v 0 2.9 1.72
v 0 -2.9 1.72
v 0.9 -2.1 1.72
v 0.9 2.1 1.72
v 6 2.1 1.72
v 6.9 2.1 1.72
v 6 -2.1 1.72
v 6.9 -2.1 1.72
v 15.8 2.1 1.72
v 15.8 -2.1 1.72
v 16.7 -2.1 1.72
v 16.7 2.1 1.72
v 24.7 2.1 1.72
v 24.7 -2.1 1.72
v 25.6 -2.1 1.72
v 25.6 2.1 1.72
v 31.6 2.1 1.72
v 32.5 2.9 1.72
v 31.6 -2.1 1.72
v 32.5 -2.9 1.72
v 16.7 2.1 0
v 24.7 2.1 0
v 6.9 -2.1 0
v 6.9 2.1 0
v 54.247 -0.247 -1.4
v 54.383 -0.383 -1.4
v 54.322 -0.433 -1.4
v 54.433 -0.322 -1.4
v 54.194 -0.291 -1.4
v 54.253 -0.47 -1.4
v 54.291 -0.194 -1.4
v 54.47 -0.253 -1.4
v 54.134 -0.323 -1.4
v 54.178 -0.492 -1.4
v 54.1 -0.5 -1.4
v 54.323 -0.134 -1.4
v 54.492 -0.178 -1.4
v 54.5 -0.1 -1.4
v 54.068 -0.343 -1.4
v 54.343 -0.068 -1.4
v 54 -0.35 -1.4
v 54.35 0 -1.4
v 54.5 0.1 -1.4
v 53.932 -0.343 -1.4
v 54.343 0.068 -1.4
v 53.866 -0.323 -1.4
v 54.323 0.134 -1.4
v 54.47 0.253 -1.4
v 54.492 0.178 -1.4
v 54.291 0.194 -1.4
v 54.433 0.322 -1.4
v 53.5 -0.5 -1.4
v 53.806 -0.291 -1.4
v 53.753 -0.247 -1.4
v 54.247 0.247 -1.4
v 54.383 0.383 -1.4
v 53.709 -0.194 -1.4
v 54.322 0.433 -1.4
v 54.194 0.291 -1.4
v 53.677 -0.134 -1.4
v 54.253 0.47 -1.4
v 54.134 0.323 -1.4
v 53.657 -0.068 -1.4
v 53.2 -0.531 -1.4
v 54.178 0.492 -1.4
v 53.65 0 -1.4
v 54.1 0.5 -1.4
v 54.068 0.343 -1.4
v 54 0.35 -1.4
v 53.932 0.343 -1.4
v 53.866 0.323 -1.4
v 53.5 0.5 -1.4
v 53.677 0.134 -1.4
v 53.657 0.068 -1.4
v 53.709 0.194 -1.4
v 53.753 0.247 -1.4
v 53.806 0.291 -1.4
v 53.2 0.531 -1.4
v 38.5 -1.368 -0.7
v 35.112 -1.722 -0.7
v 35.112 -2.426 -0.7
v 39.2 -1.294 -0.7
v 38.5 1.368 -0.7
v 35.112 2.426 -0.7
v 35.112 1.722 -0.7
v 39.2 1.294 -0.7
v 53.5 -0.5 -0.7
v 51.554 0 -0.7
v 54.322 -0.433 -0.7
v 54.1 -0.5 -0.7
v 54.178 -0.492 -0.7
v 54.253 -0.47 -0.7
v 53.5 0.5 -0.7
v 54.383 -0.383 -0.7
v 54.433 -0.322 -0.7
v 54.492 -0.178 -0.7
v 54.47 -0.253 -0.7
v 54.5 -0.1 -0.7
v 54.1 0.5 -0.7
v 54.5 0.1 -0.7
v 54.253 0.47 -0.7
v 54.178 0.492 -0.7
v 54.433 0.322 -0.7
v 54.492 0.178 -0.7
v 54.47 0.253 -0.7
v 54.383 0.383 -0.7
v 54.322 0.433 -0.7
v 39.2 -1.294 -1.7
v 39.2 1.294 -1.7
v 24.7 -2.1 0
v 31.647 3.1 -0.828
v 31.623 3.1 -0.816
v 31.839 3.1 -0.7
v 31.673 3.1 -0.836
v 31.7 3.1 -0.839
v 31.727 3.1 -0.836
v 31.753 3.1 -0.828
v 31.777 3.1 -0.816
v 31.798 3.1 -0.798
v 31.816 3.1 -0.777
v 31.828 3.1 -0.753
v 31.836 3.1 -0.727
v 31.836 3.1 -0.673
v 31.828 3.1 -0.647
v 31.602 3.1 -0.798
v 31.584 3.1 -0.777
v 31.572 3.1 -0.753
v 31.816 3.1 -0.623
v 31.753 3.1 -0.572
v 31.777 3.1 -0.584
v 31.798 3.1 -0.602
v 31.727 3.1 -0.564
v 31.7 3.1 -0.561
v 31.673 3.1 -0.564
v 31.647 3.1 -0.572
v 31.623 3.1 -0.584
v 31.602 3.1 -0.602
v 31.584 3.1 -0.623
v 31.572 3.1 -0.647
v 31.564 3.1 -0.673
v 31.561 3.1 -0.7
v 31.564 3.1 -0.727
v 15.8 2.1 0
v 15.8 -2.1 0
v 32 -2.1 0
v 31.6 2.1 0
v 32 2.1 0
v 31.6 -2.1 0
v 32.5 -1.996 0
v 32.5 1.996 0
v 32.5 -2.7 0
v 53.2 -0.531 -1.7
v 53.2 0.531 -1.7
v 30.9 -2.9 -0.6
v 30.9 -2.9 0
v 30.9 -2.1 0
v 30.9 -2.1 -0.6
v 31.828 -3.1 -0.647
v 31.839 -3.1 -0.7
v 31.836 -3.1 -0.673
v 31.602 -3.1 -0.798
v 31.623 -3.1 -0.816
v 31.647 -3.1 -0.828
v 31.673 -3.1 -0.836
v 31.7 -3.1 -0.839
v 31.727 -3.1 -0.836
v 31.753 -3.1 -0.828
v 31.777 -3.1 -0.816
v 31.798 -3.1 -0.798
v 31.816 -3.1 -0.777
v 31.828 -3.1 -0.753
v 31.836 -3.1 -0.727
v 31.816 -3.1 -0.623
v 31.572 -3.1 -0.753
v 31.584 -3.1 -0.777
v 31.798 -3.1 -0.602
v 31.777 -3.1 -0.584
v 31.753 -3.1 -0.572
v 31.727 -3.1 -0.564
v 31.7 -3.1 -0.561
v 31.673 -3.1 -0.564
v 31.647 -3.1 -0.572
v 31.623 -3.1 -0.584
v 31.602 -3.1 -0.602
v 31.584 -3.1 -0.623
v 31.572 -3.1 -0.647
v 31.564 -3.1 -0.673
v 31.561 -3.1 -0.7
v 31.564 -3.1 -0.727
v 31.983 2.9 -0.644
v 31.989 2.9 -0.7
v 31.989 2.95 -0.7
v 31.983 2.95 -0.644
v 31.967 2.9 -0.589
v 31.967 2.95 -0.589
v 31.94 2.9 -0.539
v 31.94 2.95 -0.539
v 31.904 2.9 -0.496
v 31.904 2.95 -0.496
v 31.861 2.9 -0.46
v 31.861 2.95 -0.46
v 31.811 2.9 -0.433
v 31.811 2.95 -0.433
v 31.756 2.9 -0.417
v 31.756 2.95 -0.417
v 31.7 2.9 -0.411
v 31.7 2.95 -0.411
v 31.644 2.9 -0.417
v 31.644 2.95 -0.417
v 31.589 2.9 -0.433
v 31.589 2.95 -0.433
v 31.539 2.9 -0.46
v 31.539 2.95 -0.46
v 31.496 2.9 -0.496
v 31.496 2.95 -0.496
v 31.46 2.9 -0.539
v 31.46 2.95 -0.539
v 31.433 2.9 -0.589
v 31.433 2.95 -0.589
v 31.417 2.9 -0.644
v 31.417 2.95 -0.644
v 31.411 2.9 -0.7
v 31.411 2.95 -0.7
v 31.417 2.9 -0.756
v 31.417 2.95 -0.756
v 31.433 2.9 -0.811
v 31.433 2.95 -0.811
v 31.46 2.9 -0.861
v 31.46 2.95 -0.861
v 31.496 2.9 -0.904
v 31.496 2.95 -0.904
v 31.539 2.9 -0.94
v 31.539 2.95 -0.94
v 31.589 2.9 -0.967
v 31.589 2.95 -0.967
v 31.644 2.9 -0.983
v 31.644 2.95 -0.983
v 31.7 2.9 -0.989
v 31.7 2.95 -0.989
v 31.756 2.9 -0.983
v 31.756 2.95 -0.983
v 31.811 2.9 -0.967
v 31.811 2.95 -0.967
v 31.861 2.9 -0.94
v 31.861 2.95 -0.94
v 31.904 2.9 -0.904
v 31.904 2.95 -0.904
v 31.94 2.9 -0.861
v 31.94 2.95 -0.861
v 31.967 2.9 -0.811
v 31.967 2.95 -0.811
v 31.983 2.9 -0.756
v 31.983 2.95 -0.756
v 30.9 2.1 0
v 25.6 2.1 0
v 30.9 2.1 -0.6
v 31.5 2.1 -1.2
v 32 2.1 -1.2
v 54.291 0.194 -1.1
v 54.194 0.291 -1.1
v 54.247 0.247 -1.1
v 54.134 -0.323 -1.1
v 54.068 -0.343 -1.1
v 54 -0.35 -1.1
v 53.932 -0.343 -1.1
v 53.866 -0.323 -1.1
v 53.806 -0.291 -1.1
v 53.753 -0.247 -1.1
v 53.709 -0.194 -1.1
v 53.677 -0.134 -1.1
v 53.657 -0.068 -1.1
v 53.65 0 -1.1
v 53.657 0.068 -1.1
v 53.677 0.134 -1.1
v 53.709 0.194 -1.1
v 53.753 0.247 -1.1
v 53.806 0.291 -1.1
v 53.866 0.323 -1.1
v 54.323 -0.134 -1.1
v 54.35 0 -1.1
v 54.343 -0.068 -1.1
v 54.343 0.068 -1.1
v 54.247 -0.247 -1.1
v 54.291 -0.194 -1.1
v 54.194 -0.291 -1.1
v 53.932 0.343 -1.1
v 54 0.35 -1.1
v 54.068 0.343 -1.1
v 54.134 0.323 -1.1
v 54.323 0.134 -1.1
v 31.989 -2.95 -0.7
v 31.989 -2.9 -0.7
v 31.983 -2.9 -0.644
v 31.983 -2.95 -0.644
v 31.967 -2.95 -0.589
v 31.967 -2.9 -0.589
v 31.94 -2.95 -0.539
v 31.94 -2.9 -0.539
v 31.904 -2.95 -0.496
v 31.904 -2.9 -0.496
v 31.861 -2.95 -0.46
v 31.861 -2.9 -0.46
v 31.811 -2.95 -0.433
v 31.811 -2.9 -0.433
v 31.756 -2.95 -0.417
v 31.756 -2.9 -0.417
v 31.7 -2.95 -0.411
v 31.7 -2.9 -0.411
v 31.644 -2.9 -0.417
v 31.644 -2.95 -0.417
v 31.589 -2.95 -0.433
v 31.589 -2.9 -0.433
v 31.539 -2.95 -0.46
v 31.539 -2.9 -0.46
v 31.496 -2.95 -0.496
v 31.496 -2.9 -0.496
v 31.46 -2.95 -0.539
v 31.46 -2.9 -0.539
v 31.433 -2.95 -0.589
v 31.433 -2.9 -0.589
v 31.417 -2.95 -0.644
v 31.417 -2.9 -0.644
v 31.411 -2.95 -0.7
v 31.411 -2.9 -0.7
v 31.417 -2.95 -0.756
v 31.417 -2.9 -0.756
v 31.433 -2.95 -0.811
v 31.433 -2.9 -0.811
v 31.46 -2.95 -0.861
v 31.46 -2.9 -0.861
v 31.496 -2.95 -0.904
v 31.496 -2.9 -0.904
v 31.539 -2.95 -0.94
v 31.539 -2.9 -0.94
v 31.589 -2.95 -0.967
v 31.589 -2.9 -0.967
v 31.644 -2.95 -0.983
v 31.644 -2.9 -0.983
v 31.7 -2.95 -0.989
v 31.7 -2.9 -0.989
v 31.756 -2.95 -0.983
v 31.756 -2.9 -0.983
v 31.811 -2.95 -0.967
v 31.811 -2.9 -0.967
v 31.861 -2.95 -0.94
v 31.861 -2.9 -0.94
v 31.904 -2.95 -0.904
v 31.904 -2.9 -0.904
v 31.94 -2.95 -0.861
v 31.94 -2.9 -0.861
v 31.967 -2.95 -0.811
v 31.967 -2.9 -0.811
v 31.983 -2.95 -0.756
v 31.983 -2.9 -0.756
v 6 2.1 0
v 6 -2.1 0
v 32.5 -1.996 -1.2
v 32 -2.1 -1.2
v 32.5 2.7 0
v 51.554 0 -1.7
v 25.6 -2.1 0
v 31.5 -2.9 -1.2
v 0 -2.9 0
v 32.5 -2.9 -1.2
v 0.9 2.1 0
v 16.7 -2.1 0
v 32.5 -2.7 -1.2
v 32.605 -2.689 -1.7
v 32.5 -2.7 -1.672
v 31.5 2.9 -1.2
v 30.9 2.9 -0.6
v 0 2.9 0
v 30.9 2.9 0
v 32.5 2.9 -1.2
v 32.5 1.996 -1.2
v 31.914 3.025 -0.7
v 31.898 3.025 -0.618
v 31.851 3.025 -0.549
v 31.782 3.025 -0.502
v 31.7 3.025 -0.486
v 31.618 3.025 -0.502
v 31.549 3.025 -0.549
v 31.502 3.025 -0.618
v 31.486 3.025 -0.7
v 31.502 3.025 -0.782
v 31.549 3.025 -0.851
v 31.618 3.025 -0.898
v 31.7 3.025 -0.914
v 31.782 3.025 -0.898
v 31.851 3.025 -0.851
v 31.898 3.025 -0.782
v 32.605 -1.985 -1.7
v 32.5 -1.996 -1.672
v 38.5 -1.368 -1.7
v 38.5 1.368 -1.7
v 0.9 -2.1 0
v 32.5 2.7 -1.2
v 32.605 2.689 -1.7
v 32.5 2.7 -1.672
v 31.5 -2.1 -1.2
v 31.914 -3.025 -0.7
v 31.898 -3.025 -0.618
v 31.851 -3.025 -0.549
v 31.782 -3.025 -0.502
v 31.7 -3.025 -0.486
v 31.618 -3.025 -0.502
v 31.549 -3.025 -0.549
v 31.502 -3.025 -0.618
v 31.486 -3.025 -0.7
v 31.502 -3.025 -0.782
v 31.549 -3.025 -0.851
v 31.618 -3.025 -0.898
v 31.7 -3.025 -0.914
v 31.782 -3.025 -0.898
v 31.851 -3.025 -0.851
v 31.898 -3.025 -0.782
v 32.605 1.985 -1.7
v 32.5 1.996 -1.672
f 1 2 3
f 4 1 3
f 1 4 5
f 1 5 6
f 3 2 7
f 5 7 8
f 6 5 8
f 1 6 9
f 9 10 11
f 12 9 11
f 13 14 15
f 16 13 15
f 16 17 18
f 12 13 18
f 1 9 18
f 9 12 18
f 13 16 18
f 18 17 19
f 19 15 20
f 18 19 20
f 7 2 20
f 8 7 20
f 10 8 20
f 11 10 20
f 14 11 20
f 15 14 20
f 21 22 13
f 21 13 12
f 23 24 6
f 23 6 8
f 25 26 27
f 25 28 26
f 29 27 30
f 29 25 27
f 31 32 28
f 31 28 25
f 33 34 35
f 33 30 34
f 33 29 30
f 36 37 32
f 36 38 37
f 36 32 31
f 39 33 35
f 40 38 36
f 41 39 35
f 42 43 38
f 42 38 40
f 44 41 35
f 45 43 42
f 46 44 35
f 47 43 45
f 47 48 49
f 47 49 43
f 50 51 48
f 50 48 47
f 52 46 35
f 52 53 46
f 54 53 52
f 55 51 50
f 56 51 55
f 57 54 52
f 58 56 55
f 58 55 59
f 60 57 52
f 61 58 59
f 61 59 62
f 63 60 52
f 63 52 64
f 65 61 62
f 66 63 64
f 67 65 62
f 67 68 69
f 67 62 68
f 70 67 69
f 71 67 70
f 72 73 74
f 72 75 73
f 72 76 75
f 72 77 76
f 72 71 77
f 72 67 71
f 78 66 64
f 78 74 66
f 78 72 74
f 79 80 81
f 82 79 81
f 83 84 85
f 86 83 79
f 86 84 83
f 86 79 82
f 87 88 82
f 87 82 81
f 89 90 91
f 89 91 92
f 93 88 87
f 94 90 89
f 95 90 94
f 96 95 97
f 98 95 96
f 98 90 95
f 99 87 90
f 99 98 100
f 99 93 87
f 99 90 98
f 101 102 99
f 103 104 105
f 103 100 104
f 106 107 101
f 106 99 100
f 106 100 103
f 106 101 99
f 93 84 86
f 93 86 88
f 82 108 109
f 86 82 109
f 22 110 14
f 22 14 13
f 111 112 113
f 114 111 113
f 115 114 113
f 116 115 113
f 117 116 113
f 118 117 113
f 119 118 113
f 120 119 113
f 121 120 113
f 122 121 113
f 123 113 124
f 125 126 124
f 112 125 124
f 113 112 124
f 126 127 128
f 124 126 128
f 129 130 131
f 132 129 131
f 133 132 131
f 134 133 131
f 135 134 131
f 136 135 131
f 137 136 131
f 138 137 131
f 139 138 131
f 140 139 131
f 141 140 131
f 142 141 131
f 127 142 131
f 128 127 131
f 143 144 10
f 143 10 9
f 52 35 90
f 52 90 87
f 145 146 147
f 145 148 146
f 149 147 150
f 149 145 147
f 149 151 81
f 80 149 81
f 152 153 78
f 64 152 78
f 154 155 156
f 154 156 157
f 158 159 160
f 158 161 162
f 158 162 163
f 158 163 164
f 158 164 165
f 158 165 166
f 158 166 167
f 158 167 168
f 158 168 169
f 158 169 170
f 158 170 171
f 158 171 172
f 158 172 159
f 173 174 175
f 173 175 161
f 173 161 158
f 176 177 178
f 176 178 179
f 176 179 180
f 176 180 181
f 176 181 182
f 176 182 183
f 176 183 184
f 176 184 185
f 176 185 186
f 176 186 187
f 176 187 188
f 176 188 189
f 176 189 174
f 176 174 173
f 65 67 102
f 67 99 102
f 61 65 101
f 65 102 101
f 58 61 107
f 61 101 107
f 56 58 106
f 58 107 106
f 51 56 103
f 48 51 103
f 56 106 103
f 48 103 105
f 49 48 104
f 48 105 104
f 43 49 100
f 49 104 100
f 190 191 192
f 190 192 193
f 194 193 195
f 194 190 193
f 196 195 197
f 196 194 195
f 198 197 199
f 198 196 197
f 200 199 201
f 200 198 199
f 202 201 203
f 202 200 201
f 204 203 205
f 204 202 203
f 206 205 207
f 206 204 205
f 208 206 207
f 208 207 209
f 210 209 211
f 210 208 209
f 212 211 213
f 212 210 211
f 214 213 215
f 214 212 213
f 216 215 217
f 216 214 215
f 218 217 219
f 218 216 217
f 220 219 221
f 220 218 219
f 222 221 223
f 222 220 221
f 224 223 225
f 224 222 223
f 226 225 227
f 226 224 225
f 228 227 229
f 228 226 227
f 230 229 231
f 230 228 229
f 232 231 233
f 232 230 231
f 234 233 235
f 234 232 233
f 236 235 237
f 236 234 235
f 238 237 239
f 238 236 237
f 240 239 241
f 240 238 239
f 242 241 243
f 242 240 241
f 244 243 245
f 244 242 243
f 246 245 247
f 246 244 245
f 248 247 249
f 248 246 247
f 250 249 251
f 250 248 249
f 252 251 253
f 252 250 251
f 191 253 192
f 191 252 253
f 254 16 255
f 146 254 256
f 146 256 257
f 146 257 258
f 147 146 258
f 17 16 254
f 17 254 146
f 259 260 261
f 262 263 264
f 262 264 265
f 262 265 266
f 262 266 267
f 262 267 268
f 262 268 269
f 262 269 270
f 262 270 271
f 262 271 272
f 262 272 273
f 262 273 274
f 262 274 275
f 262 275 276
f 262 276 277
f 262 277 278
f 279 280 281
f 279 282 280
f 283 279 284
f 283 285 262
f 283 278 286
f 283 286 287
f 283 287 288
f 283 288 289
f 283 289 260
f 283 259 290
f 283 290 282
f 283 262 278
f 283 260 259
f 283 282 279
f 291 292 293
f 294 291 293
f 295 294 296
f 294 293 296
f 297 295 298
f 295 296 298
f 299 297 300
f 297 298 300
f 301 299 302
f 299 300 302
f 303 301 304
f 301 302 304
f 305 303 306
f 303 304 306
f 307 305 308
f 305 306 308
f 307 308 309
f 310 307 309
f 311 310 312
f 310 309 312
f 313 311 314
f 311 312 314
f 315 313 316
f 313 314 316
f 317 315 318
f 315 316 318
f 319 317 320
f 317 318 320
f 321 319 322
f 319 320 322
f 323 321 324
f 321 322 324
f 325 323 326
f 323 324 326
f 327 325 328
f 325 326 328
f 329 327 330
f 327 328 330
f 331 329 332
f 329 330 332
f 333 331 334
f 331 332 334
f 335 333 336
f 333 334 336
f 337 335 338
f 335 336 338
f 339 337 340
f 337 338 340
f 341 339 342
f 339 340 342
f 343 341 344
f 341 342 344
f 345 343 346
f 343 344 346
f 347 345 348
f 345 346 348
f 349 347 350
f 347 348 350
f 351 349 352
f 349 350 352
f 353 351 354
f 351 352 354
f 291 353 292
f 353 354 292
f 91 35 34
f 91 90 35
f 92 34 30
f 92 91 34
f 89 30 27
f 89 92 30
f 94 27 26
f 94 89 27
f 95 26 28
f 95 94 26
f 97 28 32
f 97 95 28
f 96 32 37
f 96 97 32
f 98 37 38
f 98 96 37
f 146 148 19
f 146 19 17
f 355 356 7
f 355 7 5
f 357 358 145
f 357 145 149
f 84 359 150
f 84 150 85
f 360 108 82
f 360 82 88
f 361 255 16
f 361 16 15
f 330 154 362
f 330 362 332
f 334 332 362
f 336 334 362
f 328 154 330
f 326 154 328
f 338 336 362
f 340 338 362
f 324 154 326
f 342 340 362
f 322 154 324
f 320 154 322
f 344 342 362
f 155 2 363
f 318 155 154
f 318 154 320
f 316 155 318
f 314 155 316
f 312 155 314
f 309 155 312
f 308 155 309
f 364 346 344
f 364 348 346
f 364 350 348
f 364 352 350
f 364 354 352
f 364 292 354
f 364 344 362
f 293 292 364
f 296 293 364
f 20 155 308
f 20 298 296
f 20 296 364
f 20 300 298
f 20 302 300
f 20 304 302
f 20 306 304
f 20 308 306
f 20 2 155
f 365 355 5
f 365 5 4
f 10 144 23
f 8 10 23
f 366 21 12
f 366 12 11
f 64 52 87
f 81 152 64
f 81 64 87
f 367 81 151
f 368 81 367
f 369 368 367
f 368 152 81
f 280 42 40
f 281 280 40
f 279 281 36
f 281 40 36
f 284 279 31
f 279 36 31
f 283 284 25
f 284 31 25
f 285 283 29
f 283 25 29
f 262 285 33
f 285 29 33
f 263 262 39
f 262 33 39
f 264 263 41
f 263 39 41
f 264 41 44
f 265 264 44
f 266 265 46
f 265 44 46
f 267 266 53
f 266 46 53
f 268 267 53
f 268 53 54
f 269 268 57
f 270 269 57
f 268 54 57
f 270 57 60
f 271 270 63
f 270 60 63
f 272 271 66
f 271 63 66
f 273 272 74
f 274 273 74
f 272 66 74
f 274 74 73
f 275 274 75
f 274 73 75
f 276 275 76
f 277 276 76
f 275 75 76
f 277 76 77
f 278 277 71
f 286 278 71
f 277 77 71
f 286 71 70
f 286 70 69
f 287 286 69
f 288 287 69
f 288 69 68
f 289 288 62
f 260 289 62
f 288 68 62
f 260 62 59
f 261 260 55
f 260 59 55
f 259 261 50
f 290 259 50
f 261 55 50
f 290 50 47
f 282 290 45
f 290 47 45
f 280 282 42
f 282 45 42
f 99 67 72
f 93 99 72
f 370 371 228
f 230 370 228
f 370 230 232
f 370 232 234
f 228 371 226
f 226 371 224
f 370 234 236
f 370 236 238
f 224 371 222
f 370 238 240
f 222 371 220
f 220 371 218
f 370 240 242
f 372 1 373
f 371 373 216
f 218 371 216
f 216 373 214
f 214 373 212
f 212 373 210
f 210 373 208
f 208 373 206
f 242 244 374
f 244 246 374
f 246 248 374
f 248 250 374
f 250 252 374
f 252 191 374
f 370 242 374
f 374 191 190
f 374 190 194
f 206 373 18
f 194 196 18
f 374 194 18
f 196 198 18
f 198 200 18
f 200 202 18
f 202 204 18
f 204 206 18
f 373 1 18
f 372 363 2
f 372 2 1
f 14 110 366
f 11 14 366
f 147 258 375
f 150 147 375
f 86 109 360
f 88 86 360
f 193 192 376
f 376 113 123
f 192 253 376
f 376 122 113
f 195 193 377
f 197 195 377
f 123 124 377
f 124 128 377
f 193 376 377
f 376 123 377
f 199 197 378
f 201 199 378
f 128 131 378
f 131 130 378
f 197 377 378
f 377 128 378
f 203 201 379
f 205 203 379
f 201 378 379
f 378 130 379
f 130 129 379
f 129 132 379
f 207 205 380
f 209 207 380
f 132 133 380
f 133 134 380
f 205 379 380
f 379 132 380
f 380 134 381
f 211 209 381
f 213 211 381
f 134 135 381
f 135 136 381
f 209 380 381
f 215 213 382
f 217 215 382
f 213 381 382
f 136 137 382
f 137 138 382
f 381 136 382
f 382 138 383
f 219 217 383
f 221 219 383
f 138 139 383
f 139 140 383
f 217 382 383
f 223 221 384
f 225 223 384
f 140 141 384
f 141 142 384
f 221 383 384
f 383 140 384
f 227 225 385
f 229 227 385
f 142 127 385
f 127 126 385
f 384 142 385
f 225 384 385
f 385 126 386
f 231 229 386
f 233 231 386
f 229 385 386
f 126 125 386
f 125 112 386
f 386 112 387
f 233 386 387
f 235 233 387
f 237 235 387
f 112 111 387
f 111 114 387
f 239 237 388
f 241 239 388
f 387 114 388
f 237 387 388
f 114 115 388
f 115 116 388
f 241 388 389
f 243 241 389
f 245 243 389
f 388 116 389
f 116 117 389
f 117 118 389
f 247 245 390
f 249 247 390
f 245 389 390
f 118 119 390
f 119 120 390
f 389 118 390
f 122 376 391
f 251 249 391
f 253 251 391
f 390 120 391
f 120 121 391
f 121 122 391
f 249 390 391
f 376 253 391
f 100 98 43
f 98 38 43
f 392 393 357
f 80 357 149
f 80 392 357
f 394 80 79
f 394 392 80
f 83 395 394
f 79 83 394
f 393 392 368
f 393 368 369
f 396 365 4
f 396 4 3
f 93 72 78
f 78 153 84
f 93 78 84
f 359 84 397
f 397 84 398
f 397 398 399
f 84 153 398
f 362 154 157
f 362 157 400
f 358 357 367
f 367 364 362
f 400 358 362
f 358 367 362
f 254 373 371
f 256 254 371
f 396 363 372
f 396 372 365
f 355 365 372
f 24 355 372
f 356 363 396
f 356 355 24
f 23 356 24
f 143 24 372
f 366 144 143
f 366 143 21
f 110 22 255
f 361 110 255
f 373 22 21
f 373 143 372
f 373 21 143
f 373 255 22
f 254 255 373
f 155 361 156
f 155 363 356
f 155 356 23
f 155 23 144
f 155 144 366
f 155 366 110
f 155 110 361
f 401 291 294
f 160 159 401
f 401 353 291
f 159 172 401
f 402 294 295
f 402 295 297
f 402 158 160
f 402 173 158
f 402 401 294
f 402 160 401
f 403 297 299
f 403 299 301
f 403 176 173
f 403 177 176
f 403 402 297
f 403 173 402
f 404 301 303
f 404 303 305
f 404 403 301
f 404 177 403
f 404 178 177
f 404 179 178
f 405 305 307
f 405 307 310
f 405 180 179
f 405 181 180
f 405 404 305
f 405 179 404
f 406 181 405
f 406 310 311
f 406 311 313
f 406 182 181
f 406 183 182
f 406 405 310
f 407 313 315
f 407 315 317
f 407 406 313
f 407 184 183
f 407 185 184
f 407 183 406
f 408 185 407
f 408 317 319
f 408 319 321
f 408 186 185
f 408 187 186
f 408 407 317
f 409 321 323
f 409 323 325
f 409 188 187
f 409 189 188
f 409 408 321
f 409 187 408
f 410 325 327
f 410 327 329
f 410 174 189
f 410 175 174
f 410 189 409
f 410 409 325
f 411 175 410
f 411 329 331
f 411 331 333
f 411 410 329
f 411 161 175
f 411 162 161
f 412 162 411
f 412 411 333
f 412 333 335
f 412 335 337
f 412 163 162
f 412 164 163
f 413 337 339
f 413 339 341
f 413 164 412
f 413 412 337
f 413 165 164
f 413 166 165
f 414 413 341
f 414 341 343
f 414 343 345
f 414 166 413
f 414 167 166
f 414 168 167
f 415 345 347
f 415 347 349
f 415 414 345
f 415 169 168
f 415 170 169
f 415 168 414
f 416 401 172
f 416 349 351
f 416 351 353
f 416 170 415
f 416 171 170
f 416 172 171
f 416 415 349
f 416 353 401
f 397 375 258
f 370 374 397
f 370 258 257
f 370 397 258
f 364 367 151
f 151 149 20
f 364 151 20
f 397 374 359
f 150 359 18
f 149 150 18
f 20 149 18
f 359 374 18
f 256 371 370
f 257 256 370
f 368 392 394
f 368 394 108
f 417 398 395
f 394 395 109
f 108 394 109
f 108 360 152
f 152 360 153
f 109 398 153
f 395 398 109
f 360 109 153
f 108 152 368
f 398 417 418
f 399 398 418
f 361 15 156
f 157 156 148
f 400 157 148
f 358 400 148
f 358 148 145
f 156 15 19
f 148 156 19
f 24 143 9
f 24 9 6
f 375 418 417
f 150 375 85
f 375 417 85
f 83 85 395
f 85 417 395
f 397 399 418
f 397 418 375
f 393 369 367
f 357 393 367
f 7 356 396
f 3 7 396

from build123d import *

# Parameters (mm, degrees)
F1_DEPTH  = 1.72
F3_DEPTH  = 0.8
F5_DEPTH  = 2
F7_DEPTH  = 2.901
F8_R      = 0.2889302174
F9_DEPTH  = 0.2
F10_SIZE  = 0.15
F12_W     = 1.3
F12_H     = 0.3
F13_DEPTH = 6.001
F14_R     = 0.4
F15_R     = 0.35
F16_DEPTH = 0.3


with BuildPart() as f1:
    # F0 (on Top) → F1 (new body)
    with BuildSketch(Plane.XY):
        Polygon((0.9, 0), (0, 0), (0, -2.9), (32.5, -2.9), (32.5, 0), (31.6, 0), (31.6, -2.1), (25.6, -2.1), (25.6, 0), (24.7, 0), (24.7, -2.1), (16.7, -2.1), (16.7, 0), (15.8, 0), (15.8, -2.1), (6.9, -2.1), (6.9, 0), (6, 0), (6, -2.1), (0.9, -2.1), align=None)
    extrude(amount=F1_DEPTH)

    # F2 (on face) → F3 (join, through all)
    with BuildSketch(Plane.XZ.offset(2.9)):
        Polygon((30.9, 0), (30.9, -0.6), (32, -1.7), (32.5, -1.7), (32.5, 0), align=None)
    extrude(amount=-F3_DEPTH)

    # F4 (on face) → F5 (join)
    with BuildSketch(Plane(origin=(0, 0, -1.7), x_dir=(1, 0, 0), z_dir=(0, 0, -1))):
        Polygon((53.5, 0.5), (32.5, 2.7), (32.5, 2.1), (32, 2.1), (32.5, 1.9961692123), (38.5, 1.3675977837), (38.5, 0), (39.2, 0), (39.2, 1.2942644504), (51.5543424806, 0), (54.5, 0), (54.5, 0.5), align=None)
    extrude(amount=-F5_DEPTH)

    # F6 (on face) → F7 (cut, through all)
    with BuildSketch(Plane.XZ.offset(2.9)):
        Polygon((54.5, 0.3), (32.5, 0.3), (32.5, 0), (35.1124355653, -0.7), (54.5, -0.7), align=None)
        Polygon((32.5, -1.6719941439), (32.5, -1.2), (31.5, -1.2), (32, -1.7), (32.5, -1.7), (32.6045192778, -1.7), align=None)
    extrude(amount=-F7_DEPTH, mode=Mode.SUBTRACT)

    # F8 (on face) → F9 (join)
    with BuildSketch(Plane.XZ.offset(2.9)):
        with Locations((31.7, -0.7)):
            Circle(F8_R)
    extrude(amount=F9_DEPTH)

    # F10
    f10_edges = [f1.edges().sort_by_distance(p)[0] for p in [
        (31.41107, -3.1, -0.7),
    ]]
    chamfer(f10_edges, length=F10_SIZE)

    # F11: F1 across face


with BuildPart() as f1_1:
    add(f1.part)
    add(f1.part.mirror(Plane(origin=(16.25, 0, 0.86), x_dir=(-1, 0, 0), z_dir=(0, 1, 0))))

    # F12 (on face) → F13 (cut, through all)
    with BuildSketch(Plane(origin=(0, 2.9, 0), x_dir=(-1, 0, 0), z_dir=(0, 1, 0))):
        with Locations((-53.85, -1.55)):
            Rectangle(F12_W, F12_H)
    extrude(amount=-F13_DEPTH, mode=Mode.SUBTRACT)

    # F14
    f14_edges = [f1_1.edges().sort_by_distance(p)[0] for p in [
        (54.5, 0.5, -1.05),
        (54.5, -0.5, -1.05),
    ]]
    fillet(f14_edges, radius=F14_R)

    # F15 (on face) → F16 (cut)
    with BuildSketch(Plane(origin=(0, 0, -1.4), x_dir=(1, 0, 0), z_dir=(0, 0, -1))):
        with Locations((54, 0)):
            Circle(F15_R)
    extrude(amount=-F16_DEPTH, mode=Mode.SUBTRACT)


solid = f1_1.part
